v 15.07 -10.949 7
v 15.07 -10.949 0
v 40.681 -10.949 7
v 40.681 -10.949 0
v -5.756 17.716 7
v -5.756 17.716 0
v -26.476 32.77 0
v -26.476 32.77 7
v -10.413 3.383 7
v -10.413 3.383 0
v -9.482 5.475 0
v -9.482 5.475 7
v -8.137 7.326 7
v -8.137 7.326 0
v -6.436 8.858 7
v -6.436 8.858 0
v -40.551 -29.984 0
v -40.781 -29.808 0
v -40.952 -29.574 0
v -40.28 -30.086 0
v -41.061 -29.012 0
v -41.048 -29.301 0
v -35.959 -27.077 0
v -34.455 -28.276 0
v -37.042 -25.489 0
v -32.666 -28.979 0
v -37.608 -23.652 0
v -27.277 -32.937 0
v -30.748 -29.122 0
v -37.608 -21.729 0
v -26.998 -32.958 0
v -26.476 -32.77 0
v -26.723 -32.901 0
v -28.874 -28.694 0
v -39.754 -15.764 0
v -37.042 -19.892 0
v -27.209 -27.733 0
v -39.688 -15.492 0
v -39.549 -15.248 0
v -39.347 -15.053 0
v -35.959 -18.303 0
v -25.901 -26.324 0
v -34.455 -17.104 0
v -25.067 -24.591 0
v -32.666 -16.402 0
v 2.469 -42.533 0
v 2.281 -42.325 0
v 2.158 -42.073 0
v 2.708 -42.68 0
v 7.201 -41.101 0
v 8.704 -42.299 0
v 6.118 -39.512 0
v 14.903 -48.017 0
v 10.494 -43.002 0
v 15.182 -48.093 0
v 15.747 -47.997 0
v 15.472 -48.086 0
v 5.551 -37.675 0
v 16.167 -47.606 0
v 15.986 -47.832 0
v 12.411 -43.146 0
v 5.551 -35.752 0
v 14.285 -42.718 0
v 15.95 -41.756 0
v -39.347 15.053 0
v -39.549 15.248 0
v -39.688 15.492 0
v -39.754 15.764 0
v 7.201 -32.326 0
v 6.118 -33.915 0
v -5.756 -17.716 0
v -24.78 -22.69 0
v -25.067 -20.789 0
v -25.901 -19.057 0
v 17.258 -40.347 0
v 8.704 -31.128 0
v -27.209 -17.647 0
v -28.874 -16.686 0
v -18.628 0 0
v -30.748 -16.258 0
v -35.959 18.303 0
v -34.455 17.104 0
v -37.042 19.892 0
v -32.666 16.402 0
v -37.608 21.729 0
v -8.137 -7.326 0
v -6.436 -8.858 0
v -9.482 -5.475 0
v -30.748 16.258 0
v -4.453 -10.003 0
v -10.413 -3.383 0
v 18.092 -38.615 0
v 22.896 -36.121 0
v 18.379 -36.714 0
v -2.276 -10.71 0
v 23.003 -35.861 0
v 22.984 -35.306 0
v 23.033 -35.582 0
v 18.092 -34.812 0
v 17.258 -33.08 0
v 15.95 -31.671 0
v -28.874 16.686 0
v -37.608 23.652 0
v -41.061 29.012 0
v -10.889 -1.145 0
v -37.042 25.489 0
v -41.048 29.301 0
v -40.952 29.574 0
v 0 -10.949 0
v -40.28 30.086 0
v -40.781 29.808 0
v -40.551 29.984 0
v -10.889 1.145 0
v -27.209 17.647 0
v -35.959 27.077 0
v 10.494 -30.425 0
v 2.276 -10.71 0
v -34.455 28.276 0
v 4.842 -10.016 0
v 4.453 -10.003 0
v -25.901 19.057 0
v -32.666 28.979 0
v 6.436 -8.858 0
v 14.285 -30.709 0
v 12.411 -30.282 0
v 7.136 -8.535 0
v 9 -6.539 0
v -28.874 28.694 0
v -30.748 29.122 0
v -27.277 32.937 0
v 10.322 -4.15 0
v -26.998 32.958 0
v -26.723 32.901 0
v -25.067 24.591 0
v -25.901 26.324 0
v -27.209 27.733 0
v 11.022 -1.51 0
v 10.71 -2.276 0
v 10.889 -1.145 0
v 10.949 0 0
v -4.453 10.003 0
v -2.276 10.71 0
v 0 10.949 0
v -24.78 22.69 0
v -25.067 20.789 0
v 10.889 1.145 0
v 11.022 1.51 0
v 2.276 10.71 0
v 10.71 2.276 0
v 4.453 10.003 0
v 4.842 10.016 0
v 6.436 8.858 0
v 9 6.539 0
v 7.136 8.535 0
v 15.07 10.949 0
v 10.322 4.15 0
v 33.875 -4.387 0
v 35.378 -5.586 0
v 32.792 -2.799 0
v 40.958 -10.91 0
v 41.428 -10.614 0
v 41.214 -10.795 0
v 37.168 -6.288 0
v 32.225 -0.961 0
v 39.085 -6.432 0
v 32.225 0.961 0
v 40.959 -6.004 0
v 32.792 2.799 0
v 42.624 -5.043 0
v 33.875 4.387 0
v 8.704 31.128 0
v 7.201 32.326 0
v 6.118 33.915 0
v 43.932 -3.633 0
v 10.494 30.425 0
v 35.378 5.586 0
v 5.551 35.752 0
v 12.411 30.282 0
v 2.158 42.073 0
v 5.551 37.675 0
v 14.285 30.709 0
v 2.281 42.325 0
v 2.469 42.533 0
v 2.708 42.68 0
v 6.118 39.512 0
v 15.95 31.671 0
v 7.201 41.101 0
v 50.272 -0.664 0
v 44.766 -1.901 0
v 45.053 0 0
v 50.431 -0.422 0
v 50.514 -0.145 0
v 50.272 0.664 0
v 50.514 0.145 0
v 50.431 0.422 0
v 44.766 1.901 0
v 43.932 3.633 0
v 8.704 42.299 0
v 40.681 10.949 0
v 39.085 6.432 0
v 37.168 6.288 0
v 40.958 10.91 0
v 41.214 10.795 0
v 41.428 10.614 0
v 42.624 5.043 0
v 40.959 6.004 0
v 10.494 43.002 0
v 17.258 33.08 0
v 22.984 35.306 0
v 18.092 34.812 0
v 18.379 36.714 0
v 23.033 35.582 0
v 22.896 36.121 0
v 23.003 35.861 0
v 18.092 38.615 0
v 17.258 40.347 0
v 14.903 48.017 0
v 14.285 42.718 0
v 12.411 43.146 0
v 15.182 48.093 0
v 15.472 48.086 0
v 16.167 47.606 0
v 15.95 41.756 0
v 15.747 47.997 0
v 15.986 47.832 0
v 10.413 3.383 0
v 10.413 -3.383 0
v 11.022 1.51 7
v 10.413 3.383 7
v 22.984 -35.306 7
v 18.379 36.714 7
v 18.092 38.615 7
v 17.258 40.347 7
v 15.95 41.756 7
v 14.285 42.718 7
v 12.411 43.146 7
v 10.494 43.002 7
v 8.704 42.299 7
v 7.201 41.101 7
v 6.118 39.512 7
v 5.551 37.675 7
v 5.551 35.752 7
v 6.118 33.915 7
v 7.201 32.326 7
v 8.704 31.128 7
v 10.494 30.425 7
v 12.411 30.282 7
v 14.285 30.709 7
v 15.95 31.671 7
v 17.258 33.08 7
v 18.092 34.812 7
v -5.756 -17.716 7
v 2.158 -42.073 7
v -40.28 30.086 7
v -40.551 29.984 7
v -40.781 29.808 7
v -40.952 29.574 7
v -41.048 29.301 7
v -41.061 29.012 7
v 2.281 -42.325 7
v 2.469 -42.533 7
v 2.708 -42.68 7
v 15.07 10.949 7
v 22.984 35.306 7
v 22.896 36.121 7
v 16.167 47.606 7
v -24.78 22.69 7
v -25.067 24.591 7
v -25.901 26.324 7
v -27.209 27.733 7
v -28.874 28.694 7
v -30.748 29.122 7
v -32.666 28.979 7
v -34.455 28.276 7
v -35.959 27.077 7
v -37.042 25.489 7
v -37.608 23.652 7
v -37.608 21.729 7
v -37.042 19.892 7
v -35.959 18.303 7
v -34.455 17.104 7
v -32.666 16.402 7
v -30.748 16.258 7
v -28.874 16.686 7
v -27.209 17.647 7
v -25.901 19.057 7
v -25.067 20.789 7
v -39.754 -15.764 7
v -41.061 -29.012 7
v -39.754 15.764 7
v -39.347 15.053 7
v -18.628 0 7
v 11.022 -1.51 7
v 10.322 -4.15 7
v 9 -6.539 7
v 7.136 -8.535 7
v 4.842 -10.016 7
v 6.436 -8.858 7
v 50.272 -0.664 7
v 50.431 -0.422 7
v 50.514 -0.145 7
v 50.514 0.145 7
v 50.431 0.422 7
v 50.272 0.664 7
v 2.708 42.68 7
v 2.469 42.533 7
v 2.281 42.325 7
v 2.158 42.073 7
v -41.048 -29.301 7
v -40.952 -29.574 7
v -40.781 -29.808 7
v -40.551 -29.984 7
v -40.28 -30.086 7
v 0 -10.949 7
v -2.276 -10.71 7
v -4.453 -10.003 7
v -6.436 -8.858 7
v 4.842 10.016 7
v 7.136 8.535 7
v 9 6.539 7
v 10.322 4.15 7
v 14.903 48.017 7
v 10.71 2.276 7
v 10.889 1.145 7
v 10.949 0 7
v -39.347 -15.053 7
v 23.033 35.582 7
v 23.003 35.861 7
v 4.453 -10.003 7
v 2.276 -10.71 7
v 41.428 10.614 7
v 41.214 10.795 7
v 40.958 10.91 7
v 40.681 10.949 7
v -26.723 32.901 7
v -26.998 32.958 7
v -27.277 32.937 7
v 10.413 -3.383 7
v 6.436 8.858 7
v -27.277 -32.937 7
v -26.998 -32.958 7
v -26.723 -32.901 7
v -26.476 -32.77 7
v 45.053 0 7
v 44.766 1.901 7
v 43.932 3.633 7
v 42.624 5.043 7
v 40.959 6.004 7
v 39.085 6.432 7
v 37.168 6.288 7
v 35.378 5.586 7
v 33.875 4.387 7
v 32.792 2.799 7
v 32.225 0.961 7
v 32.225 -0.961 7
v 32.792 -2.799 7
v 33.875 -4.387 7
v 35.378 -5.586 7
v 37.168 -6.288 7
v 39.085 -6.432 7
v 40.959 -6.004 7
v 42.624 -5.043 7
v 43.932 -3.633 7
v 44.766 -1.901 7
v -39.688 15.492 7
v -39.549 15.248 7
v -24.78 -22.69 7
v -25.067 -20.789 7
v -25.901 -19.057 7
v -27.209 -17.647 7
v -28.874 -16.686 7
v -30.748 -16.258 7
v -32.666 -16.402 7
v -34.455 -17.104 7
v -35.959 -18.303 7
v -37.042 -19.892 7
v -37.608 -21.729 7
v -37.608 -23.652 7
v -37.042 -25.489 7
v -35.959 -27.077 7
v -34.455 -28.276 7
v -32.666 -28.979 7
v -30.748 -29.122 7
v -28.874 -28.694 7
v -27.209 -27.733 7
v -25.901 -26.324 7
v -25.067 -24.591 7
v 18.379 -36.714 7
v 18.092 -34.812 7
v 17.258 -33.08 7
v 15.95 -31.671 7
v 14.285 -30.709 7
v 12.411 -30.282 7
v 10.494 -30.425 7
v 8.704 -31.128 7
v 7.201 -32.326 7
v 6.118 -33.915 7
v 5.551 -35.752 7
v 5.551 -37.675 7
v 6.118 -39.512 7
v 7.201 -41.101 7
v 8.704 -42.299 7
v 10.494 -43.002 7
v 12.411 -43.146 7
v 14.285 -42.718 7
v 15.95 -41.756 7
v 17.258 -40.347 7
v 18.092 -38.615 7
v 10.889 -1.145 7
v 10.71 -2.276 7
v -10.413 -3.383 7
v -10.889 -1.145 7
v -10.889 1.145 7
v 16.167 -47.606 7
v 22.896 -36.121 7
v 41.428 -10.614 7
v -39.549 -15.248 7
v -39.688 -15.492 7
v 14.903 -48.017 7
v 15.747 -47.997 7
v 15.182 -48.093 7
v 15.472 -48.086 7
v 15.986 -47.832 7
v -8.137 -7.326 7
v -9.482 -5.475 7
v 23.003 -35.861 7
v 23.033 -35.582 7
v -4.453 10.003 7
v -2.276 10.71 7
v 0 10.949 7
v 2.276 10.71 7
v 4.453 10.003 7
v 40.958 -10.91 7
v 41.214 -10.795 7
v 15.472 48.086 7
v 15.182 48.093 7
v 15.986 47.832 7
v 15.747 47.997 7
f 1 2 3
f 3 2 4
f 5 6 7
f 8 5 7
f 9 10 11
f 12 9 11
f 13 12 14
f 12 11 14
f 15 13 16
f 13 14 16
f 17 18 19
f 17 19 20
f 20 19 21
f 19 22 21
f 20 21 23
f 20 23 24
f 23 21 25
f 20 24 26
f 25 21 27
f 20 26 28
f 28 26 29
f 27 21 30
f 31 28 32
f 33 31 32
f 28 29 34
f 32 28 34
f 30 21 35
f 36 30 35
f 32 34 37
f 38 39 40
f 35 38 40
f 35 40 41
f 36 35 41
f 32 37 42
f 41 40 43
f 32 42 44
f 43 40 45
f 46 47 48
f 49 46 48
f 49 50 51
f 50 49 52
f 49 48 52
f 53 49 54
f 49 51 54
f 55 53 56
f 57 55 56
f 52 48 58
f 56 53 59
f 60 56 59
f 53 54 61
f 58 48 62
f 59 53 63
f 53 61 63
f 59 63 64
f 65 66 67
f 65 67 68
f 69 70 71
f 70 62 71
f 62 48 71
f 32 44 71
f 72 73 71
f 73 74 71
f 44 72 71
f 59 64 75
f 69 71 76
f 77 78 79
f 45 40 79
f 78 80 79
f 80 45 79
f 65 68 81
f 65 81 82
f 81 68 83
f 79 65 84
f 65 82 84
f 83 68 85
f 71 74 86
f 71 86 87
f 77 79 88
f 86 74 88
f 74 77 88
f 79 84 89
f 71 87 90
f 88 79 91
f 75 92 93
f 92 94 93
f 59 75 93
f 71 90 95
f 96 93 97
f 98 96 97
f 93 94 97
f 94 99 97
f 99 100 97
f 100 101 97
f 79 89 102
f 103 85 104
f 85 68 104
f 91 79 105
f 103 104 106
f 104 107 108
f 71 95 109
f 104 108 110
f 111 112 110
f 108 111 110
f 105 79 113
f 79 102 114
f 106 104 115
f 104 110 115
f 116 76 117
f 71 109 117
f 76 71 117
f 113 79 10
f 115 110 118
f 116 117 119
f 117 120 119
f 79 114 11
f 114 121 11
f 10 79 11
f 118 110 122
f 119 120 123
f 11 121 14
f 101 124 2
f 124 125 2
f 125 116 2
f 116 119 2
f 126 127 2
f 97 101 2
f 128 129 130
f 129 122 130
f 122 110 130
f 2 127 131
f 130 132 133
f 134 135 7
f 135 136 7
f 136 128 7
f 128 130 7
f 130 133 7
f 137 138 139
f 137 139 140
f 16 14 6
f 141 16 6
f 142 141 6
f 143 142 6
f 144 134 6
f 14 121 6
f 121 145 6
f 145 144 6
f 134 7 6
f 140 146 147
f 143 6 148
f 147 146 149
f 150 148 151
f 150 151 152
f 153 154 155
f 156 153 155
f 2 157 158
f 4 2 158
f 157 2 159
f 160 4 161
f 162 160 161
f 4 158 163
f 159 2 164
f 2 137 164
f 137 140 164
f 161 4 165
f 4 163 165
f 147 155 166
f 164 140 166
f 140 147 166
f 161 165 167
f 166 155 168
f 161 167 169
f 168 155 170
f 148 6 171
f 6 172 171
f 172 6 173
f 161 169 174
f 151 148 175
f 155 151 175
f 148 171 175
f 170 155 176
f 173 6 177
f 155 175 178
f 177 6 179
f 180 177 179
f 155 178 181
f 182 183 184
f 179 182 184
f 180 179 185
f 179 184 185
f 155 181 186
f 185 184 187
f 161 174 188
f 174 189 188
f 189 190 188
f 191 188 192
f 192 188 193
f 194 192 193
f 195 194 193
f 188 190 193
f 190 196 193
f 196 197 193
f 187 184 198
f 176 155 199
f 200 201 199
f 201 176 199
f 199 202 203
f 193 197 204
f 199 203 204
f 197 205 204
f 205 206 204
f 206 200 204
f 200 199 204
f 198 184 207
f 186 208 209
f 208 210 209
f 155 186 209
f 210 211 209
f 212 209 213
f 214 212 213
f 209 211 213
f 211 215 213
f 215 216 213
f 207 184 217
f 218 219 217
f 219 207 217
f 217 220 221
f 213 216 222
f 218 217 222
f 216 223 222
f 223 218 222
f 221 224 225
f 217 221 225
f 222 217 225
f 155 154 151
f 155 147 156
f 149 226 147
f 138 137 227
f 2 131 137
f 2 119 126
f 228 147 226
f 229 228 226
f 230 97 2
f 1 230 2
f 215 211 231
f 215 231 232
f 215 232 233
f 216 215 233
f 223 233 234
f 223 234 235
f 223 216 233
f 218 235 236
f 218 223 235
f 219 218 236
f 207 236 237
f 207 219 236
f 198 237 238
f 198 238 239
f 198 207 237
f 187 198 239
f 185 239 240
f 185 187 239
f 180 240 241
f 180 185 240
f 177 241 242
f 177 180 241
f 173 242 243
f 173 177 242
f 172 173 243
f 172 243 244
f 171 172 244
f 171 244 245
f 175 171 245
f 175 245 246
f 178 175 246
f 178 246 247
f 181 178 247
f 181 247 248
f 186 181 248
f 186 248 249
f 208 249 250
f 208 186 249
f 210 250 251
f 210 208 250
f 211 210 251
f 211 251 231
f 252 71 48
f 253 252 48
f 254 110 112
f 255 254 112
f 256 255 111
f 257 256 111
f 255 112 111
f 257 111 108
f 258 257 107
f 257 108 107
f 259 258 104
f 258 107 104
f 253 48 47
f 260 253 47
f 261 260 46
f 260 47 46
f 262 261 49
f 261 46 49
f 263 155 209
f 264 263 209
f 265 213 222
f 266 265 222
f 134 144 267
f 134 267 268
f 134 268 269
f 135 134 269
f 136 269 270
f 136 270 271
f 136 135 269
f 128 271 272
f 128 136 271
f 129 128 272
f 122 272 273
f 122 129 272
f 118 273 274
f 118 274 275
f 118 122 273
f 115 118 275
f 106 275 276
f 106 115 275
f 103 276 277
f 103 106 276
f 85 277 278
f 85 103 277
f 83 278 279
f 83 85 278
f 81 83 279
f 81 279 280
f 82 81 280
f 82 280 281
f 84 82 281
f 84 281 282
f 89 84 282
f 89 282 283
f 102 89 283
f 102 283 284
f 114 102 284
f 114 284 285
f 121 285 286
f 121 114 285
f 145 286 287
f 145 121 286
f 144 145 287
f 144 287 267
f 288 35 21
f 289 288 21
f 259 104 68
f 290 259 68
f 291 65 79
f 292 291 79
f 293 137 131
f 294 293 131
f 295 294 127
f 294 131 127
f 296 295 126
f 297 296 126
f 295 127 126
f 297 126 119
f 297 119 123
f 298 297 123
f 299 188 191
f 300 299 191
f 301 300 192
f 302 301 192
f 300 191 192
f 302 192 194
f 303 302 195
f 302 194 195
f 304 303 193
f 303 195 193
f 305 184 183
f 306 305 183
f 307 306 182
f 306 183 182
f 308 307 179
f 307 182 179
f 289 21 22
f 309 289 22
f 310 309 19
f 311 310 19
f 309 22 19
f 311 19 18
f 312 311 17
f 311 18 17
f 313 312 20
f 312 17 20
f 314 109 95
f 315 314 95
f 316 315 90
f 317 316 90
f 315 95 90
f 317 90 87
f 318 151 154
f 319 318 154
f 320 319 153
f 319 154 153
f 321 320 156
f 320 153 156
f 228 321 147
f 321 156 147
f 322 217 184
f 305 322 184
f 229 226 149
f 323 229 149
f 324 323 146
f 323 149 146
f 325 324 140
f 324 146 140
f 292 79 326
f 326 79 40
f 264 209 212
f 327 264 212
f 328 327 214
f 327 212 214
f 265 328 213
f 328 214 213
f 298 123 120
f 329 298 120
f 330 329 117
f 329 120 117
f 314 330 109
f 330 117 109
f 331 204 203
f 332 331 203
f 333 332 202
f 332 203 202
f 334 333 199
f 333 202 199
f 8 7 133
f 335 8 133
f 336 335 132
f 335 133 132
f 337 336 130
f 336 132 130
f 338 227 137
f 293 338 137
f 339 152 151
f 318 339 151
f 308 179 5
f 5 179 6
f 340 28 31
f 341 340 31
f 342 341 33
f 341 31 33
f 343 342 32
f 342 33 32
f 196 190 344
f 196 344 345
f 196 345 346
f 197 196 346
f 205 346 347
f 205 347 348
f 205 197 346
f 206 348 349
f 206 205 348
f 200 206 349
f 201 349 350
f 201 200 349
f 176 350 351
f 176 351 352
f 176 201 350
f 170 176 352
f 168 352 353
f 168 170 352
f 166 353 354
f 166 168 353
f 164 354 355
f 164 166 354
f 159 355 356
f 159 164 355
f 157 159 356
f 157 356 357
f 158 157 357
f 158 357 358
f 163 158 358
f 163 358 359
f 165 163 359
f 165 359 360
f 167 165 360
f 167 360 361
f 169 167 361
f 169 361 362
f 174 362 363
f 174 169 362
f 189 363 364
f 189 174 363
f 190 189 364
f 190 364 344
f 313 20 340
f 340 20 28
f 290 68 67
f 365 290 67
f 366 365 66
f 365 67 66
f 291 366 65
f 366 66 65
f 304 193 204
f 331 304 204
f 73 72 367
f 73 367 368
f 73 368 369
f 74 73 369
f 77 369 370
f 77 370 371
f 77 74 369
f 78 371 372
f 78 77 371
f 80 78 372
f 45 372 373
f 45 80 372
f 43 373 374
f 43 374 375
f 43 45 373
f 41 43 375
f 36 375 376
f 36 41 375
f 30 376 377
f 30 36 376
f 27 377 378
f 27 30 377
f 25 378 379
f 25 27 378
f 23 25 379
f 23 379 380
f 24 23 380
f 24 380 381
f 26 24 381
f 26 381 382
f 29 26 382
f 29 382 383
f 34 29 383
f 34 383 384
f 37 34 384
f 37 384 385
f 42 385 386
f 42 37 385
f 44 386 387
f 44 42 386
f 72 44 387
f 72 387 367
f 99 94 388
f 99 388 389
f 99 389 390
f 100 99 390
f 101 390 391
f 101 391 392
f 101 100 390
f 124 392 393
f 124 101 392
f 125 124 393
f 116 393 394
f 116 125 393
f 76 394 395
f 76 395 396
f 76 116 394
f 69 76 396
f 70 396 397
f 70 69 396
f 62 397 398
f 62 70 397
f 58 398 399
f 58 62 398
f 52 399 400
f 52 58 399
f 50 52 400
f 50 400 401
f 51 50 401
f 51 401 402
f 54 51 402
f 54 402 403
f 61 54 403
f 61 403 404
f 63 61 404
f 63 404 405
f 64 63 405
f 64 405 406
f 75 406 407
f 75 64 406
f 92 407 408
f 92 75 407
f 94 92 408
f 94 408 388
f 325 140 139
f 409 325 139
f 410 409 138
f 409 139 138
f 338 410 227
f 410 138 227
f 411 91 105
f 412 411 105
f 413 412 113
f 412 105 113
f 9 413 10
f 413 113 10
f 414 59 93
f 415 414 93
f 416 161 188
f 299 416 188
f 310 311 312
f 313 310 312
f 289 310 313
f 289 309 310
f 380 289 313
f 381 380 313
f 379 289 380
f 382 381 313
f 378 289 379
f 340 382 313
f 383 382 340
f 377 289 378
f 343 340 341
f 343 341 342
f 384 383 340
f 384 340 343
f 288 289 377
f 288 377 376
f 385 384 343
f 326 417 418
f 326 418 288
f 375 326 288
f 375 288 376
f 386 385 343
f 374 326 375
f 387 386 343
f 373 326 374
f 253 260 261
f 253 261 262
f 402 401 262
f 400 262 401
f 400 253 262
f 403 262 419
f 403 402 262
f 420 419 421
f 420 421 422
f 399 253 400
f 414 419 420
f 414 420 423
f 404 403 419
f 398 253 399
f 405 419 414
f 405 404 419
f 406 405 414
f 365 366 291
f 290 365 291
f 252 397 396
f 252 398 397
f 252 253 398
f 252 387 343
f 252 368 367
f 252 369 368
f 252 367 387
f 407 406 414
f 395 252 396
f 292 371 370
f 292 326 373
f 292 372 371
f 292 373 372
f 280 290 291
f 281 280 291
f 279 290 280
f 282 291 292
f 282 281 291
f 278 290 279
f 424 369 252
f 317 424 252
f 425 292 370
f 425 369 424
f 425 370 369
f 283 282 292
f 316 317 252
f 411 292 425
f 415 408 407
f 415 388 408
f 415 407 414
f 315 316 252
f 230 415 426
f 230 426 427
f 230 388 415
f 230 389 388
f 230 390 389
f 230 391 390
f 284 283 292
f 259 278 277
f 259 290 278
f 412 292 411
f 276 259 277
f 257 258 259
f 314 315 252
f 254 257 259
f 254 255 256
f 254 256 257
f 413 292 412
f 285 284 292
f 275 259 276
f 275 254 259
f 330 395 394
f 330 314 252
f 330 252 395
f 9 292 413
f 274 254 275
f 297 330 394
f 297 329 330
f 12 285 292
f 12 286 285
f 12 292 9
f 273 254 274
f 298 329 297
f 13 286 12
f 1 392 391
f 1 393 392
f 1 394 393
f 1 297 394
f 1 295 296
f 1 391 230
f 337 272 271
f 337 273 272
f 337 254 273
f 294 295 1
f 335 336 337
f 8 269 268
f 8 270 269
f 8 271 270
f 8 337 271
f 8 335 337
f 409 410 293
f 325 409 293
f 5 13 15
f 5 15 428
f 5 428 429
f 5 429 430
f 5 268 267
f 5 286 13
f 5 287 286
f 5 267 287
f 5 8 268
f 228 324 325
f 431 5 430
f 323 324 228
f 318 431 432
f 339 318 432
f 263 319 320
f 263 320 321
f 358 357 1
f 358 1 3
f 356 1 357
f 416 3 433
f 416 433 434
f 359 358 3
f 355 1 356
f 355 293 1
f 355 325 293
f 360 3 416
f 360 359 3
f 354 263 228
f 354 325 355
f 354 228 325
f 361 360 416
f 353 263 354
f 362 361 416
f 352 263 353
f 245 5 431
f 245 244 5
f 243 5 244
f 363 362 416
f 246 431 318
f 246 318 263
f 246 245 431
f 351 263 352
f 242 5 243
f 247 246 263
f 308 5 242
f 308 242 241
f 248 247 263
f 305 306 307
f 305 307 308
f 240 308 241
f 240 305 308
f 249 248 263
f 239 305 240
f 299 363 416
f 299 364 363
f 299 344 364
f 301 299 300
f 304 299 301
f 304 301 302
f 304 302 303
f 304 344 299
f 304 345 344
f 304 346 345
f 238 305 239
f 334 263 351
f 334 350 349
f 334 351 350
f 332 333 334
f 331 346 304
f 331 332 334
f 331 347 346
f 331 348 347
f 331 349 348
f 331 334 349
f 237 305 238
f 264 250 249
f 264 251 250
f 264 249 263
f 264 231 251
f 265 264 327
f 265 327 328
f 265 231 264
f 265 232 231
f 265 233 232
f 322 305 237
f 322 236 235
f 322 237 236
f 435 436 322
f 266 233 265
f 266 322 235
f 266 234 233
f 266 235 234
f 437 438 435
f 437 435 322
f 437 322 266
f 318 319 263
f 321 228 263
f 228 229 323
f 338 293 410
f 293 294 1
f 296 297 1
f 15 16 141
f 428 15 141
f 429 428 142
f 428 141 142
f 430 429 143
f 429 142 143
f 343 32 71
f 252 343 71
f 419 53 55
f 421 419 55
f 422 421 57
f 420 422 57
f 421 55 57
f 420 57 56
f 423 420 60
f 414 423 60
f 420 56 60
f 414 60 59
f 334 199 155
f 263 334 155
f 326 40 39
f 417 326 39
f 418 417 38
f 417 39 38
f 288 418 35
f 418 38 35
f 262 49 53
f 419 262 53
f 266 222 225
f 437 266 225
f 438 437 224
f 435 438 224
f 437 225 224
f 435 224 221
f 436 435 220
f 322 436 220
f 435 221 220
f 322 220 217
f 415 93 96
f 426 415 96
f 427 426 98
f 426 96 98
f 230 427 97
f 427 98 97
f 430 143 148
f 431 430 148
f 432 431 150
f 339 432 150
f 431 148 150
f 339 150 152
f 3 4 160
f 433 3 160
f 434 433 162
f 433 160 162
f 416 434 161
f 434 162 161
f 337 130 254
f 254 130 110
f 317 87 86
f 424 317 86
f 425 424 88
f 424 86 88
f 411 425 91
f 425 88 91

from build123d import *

# Parameters (mm, degrees)
F0_R     = 6.45
F1_DEPTH = 7


with BuildPart() as f1:
    # F0 (on Top) → F1 (new body)
    with BuildSketch(Plane.XY):
        with BuildLine():
            ThreePointArc((4.8420579254, 10.0159922148), (9.0003140624, 6.5391109318), (11.0220528498, 1.5099589323))
            Line((11.0220528498, 1.5099589323), (11.5126682474, 0))
            Line((11.5126682474, 0), (15.0702783864, 10.9491981566))
            Line((15.0702783864, 10.9491981566), (3.557610139, 10.9491981566))
            Line((3.557610139, 10.9491981566), (4.8420579254, 10.0159922148))
        make_face()
        with BuildLine():
            Line((15.0702783864, 10.9491981566), (11.5126682474, 0))
            Line((11.5126682474, 0), (15.0702783864, -10.9491981566))
            Line((15.0702783864, -10.9491981566), (40.6806125224, -10.9491981566))
            ThreePointArc((40.6806125224, -10.9491981566), (41.0902684989, -10.8614382461), (41.4280217317, -10.6135621185))
            Line((41.4280217317, -10.6135621185), (50.2717563602, -0.6643639619))
            ThreePointArc((50.2717563602, -0.6643639619), (50.5243471509, 0), (50.2717563602, 0.6643639619))
            Line((50.2717563602, 0.6643639619), (41.4280217317, 10.6135621185))
            ThreePointArc((41.4280217317, 10.6135621185), (41.0902684989, 10.8614382461), (40.6806125224, 10.9491981566))
            Line((40.6806125224, 10.9491981566), (15.0702783864, 10.9491981566))
        make_face()
        with Locations((38.6029407382, 0)):
            Circle(F0_R, mode=Mode.SUBTRACT)
        with BuildLine():
            Line((-26.4755296714, -32.7695514784), (-5.7563341237, -17.7161747669))
            Line((-5.7563341237, -17.7161747669), (-9.3139442627, -6.7669766103))
            Line((-9.3139442627, -6.7669766103), (-18.6278885254, 0))
            Line((-18.6278885254, 0), (-39.3470840731, -15.0533767114))
            ThreePointArc((-39.3470840731, -15.0533767114), (-39.6269187388, -15.3651657119), (-39.7544689118, -15.7642280808))
            Line((-39.7544689118, -15.7642280808), (-41.0612085714, -29.0115152597))
            ThreePointArc((-41.0612085714, -29.0115152597), (-40.8750554748, -29.697466137), (-40.2802018935, -30.086478731))
            Line((-40.2802018935, -30.086478731), (-27.2774783367, -32.9373323303))
            ThreePointArc((-27.2774783367, -32.9373323303), (-26.8585322992, -32.9393419609), (-26.4755296714, -32.7695514784))
        make_face()
        with Locations((-31.2304350901, -22.690239261)):
            Circle(F0_R, mode=Mode.SUBTRACT)
        with BuildLine():
            Line((-5.7563341237, 17.7161747669), (3.557610139, 10.9491981566))
            Line((3.557610139, 10.9491981566), (15.0702783864, 10.9491981566))
            Line((15.0702783864, 10.9491981566), (22.9843068661, 35.3060733212))
            ThreePointArc((22.9843068661, 35.3060733212), (23.0274328899, 35.7227986108), (22.8960601724, 36.1206189597))
            Line((22.8960601724, 36.1206189597), (16.1666747276, 47.6059817172))
            ThreePointArc((16.1666747276, 47.6059817172), (15.6128818993, 48.0515095894), (14.9029793772, 48.0165812266))
            Line((14.9029793772, 48.0165812266), (2.7078653445, 42.6801610906))
            ThreePointArc((2.7078653445, 42.6801610906), (2.3677496493, 42.4355366136), (2.157694356, 42.0730499315))
            Line((2.157694356, 42.0730499315), (-5.7563341237, 17.7161747669))
        make_face()
        with Locations((11.928964721, 36.7135783372)):
            Circle(F0_R, mode=Mode.SUBTRACT)
        with BuildLine():
            ThreePointArc((1.9699453616, 10.9491981566), (3.4378140624, 10.5805037438), (4.8420579254, 10.0159922148))
            Line((4.8420579254, 10.0159922148), (3.557610139, 10.9491981566))
            Line((3.557610139, 10.9491981566), (1.9699453616, 10.9491981566))
        make_face()
        with BuildLine():
            ThreePointArc((-8.0294964764, 7.7001825521), (-3.4378140624, 10.5805037438), (1.9699453616, 10.9491981566))
            Line((1.9699453616, 10.9491981566), (3.557610139, 10.9491981566))
            Line((3.557610139, 10.9491981566), (-5.7563341237, 17.7161747669))
            Line((-5.7563341237, 17.7161747669), (-9.3139442627, 6.7669766103))
            Line((-9.3139442627, 6.7669766103), (-8.0294964764, 7.7001825521))
        make_face()
        with BuildLine():
            ThreePointArc((-9.8045596603, 5.257017678), (-9.0003140624, 6.5391109318), (-8.0294964764, 7.7001825521))
            Line((-8.0294964764, 7.7001825521), (-9.3139442627, 6.7669766103))
            Line((-9.3139442627, 6.7669766103), (-9.8045596603, 5.257017678))
        make_face()
        with BuildLine():
            ThreePointArc((-9.8045596603, -5.257017678), (-11.125, 0), (-9.8045596603, 5.257017678))
            Line((-9.8045596603, 5.257017678), (-9.3139442627, 6.7669766103))
            Line((-9.3139442627, 6.7669766103), (-18.6278885254, 0))
            Line((-18.6278885254, 0), (-9.3139442627, -6.7669766103))
            Line((-9.3139442627, -6.7669766103), (-9.8045596603, -5.257017678))
        make_face()
        with BuildLine():
            Line((-9.3139442627, -6.7669766103), (-8.0294964764, -7.7001825521))
            ThreePointArc((-8.0294964764, -7.7001825521), (-9.0003140624, -6.5391109318), (-9.8045596603, -5.257017678))
            Line((-9.8045596603, -5.257017678), (-9.3139442627, -6.7669766103))
        make_face()
        with BuildLine():
            Line((3.557610139, -10.9491981566), (1.9699453616, -10.9491981566))
            ThreePointArc((1.9699453616, -10.9491981566), (-3.4378140624, -10.5805037438), (-8.0294964764, -7.7001825521))
            Line((-8.0294964764, -7.7001825521), (-9.3139442627, -6.7669766103))
            Line((-9.3139442627, -6.7669766103), (-5.7563341237, -17.7161747669))
            Line((-5.7563341237, -17.7161747669), (3.557610139, -10.9491981566))
        make_face()
        with BuildLine():
            Line((3.557610139, -10.9491981566), (4.8420579254, -10.0159922148))
            ThreePointArc((4.8420579254, -10.0159922148), (3.4378140624, -10.5805037438), (1.9699453616, -10.9491981566))
            Line((1.9699453616, -10.9491981566), (3.557610139, -10.9491981566))
        make_face()
        with BuildLine():
            Line((11.5126682474, 0), (11.0220528498, -1.5099589323))
            ThreePointArc((11.0220528498, -1.5099589323), (9.0003140624, -6.5391109318), (4.8420579254, -10.0159922148))
            Line((4.8420579254, -10.0159922148), (3.557610139, -10.9491981566))
            Line((3.557610139, -10.9491981566), (15.0702783864, -10.9491981566))
            Line((15.0702783864, -10.9491981566), (11.5126682474, 0))
        make_face()
        with BuildLine():
            ThreePointArc((11.0220528498, 1.5099589323), (11.0992333734, 0.7567321344), (11.125, 0))
            ThreePointArc((11.125, 0), (11.0992333734, -0.7567321344), (11.0220528498, -1.5099589323))
            Line((11.0220528498, -1.5099589323), (11.5126682474, 0))
            Line((11.5126682474, 0), (11.0220528498, 1.5099589323))
        make_face()
        with BuildLine():
            Line((0, 10.9491981566), (1.9699453616, 10.9491981566))
            ThreePointArc((1.9699453616, 10.9491981566), (-3.4378140624, 10.5805037438), (-8.0294964764, 7.7001825521))
            Line((-8.0294964764, 7.7001825521), (-6.4357772009, 8.8580873835))
            ThreePointArc((-6.4357772009, 8.8580873835), (-3.3834883052, 10.413306255), (0, 10.9491981566))
        make_face()
        with BuildLine():
            ThreePointArc((-8.0294964764, -7.7001825521), (-3.4378140624, -10.5805037438), (1.9699453616, -10.9491981566))
            Line((1.9699453616, -10.9491981566), (0, -10.9491981566))
            ThreePointArc((0, -10.9491981566), (-3.3834883052, -10.413306255), (-6.4357772009, -8.8580873835))
            Line((-6.4357772009, -8.8580873835), (-8.0294964764, -7.7001825521))
        make_face()
        with BuildLine():
            Line((22.9843068661, -35.3060733212), (15.0702783864, -10.9491981566))
            Line((15.0702783864, -10.9491981566), (3.557610139, -10.9491981566))
            Line((3.557610139, -10.9491981566), (-5.7563341237, -17.7161747669))
            Line((-5.7563341237, -17.7161747669), (2.157694356, -42.0730499315))
            ThreePointArc((2.157694356, -42.0730499315), (2.3677496493, -42.4355366136), (2.7078653445, -42.6801610906))
            Line((2.7078653445, -42.6801610906), (14.9029793772, -48.0165812266))
            ThreePointArc((14.9029793772, -48.0165812266), (15.6128818993, -48.0515095894), (16.1666747276, -47.6059817172))
            Line((16.1666747276, -47.6059817172), (22.8960601724, -36.1206189597))
            ThreePointArc((22.8960601724, -36.1206189597), (23.0274328899, -35.7227986108), (22.9843068661, -35.3060733212))
        make_face()
        with Locations((11.928964721, -36.7135783372)):
            Circle(F0_R, mode=Mode.SUBTRACT)
        with BuildLine():
            Line((-9.3139442627, 6.7669766103), (-5.7563341237, 17.7161747669))
            Line((-5.7563341237, 17.7161747669), (-26.4755296714, 32.7695514784))
            ThreePointArc((-26.4755296714, 32.7695514784), (-26.8585322992, 32.9393419609), (-27.2774783367, 32.9373323303))
            Line((-27.2774783367, 32.9373323303), (-40.2802018935, 30.086478731))
            ThreePointArc((-40.2802018935, 30.086478731), (-40.8750554748, 29.697466137), (-41.0612085714, 29.0115152597))
            Line((-41.0612085714, 29.0115152597), (-39.7544689118, 15.7642280808))
            ThreePointArc((-39.7544689118, 15.7642280808), (-39.6269187388, 15.3651657119), (-39.3470840731, 15.0533767114))
            Line((-39.3470840731, 15.0533767114), (-18.6278885254, 0))
            Line((-18.6278885254, 0), (-9.3139442627, 6.7669766103))
        make_face()
        with Locations((-31.2304350901, 22.690239261)):
            Circle(F0_R, mode=Mode.SUBTRACT)
        with BuildLine():
            Line((-10.413306255, 3.3834883052), (-9.8045596603, 5.257017678))
            ThreePointArc((-9.8045596603, 5.257017678), (-11.125, 0), (-9.8045596603, -5.257017678))
            Line((-9.8045596603, -5.257017678), (-10.413306255, -3.3834883052))
            ThreePointArc((-10.413306255, -3.3834883052), (-10.9491981566, 0), (-10.413306255, 3.3834883052))
        make_face()
        with BuildLine():
            Line((-6.4357772009, 8.8580873835), (-8.0294964764, 7.7001825521))
            ThreePointArc((-8.0294964764, 7.7001825521), (-9.0003140624, 6.5391109318), (-9.8045596603, 5.257017678))
            Line((-9.8045596603, 5.257017678), (-10.413306255, 3.3834883052))
            ThreePointArc((-10.413306255, 3.3834883052), (-8.8580873835, 6.4357772009), (-6.4357772009, 8.8580873835))
        make_face()
        with BuildLine():
            ThreePointArc((11.0220528498, -1.5099589323), (11.0992333734, -0.7567321344), (11.125, 0))
            ThreePointArc((11.125, 0), (11.0992333734, 0.7567321344), (11.0220528498, 1.5099589323))
            Line((11.0220528498, 1.5099589323), (10.413306255, 3.3834883052))
            ThreePointArc((10.413306255, 3.3834883052), (10.8143953581, 1.7128319562), (10.9491981566, 0))
            ThreePointArc((10.9491981566, 0), (10.8143953581, -1.7128319562), (10.413306255, -3.3834883052))
            Line((10.413306255, -3.3834883052), (11.0220528498, -1.5099589323))
        make_face()
        with BuildLine():
            ThreePointArc((1.9699453616, -10.9491981566), (3.4378140624, -10.5805037438), (4.8420579254, -10.0159922148))
            Line((4.8420579254, -10.0159922148), (6.4357772009, -8.8580873835))
            ThreePointArc((6.4357772009, -8.8580873835), (3.3834883052, -10.413306255), (0, -10.9491981566))
            Line((0, -10.9491981566), (1.9699453616, -10.9491981566))
        make_face()
        with BuildLine():
            ThreePointArc((-9.8045596603, -5.257017678), (-9.0003140624, -6.5391109318), (-8.0294964764, -7.7001825521))
            Line((-8.0294964764, -7.7001825521), (-6.4357772009, -8.8580873835))
            ThreePointArc((-6.4357772009, -8.8580873835), (-8.8580873835, -6.4357772009), (-10.413306255, -3.3834883052))
            Line((-10.413306255, -3.3834883052), (-9.8045596603, -5.257017678))
        make_face()
        with BuildLine():
            Line((6.4357772009, 8.8580873835), (4.8420579254, 10.0159922148))
            ThreePointArc((4.8420579254, 10.0159922148), (3.4378140624, 10.5805037438), (1.9699453616, 10.9491981566))
            Line((1.9699453616, 10.9491981566), (0, 10.9491981566))
            ThreePointArc((0, 10.9491981566), (3.3834883052, 10.413306255), (6.4357772009, 8.8580873835))
        make_face()
    extrude(amount=F1_DEPTH)


solid = f1.part
